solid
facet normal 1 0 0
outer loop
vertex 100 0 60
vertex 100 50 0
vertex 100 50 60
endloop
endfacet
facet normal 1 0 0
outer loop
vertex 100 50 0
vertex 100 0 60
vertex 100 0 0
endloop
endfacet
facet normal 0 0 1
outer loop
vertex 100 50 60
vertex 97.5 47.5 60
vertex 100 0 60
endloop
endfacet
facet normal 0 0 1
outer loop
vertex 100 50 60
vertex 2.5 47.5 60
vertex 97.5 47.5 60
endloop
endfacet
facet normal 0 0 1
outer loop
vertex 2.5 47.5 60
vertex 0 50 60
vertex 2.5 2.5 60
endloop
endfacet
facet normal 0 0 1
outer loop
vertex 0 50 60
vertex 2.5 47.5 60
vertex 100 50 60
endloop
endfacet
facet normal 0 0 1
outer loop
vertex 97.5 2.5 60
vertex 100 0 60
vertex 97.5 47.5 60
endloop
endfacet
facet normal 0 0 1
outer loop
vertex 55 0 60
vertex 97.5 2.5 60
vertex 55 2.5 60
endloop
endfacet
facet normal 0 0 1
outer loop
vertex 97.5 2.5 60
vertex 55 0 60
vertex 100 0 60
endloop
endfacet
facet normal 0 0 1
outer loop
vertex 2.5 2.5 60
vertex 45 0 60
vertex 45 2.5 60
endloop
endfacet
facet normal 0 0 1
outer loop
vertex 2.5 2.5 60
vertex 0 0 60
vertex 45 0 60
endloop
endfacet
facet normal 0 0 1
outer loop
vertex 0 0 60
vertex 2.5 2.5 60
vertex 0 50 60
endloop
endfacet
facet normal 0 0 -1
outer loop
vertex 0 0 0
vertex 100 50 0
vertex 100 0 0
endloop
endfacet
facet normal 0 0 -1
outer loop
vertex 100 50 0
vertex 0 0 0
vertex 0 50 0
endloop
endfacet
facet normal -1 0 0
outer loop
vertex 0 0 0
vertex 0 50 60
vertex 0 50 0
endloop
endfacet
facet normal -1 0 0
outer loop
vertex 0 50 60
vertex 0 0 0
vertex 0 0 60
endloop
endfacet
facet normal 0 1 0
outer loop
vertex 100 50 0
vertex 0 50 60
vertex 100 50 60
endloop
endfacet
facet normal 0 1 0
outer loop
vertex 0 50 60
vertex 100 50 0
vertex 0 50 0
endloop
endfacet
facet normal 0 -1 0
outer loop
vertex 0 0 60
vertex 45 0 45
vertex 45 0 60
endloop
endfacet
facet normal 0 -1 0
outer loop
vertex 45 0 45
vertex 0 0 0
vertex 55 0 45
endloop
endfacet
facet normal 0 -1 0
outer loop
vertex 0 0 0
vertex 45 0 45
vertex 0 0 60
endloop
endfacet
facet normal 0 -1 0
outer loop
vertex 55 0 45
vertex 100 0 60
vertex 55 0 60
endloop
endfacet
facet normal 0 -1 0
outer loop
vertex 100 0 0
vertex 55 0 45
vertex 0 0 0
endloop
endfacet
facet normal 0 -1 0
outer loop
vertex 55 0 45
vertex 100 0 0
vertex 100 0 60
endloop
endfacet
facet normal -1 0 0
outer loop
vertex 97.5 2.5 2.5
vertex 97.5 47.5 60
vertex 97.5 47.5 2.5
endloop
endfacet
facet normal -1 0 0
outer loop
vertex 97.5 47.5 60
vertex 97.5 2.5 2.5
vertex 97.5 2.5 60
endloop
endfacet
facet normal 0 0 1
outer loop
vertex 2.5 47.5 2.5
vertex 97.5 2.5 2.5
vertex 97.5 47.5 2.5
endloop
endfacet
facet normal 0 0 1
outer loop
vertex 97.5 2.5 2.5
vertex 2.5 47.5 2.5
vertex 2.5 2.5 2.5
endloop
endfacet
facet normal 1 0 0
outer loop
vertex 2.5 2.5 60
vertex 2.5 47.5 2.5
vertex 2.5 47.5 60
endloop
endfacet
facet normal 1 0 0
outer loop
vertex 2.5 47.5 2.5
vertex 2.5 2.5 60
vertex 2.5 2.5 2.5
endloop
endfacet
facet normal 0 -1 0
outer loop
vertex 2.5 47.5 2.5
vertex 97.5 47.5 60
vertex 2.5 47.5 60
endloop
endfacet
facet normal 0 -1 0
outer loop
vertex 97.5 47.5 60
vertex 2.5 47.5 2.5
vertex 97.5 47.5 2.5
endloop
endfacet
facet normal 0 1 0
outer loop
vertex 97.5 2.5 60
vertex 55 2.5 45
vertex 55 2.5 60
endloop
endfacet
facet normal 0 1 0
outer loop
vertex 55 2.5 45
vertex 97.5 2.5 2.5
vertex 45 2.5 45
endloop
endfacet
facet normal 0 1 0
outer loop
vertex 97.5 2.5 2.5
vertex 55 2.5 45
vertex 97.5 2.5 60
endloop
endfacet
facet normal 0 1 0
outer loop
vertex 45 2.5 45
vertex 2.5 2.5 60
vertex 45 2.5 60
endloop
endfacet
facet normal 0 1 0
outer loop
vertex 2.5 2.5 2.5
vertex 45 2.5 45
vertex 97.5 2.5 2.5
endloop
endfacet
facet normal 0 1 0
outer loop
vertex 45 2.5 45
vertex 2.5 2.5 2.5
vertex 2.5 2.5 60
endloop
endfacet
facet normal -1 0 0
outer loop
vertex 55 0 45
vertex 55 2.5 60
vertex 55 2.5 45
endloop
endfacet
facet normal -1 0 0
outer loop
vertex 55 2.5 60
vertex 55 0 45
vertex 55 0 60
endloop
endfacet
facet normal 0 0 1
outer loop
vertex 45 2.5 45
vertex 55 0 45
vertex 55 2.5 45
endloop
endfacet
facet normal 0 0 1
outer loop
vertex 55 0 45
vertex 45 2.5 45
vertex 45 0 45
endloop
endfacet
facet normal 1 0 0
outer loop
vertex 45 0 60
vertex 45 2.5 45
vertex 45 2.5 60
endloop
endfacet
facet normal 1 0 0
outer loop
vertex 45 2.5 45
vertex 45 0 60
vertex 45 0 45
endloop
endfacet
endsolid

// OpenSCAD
$fn = 32;

// ----------------------------------------------------------------------
// Enclosure box: notch enclosure
// ----------------------------------------------------------------------

// --- parameters (mm) ---
box_l = 100;              // outer length, X
box_w = 50;               // outer width, Y
box_h = 60;               // outer height
wall_t = 2.5;             // wall thickness
notch_w = 10;             // cable notch width
notch_h = 15;             // cable notch height

inner_h = box_h - wall_t;  // cavity depth
boss_h = inner_h - 2;  // corner boss height

difference() {
  cube([box_l, box_w, box_h]);
  translate([wall_t, wall_t, wall_t])
    cube([box_l - 2 * wall_t, box_w - 2 * wall_t, box_h]);
  translate([box_l / 2 - notch_w / 2, -1, box_h - notch_h])
    cube([notch_w, wall_t + 2, notch_h + 1]);
}
